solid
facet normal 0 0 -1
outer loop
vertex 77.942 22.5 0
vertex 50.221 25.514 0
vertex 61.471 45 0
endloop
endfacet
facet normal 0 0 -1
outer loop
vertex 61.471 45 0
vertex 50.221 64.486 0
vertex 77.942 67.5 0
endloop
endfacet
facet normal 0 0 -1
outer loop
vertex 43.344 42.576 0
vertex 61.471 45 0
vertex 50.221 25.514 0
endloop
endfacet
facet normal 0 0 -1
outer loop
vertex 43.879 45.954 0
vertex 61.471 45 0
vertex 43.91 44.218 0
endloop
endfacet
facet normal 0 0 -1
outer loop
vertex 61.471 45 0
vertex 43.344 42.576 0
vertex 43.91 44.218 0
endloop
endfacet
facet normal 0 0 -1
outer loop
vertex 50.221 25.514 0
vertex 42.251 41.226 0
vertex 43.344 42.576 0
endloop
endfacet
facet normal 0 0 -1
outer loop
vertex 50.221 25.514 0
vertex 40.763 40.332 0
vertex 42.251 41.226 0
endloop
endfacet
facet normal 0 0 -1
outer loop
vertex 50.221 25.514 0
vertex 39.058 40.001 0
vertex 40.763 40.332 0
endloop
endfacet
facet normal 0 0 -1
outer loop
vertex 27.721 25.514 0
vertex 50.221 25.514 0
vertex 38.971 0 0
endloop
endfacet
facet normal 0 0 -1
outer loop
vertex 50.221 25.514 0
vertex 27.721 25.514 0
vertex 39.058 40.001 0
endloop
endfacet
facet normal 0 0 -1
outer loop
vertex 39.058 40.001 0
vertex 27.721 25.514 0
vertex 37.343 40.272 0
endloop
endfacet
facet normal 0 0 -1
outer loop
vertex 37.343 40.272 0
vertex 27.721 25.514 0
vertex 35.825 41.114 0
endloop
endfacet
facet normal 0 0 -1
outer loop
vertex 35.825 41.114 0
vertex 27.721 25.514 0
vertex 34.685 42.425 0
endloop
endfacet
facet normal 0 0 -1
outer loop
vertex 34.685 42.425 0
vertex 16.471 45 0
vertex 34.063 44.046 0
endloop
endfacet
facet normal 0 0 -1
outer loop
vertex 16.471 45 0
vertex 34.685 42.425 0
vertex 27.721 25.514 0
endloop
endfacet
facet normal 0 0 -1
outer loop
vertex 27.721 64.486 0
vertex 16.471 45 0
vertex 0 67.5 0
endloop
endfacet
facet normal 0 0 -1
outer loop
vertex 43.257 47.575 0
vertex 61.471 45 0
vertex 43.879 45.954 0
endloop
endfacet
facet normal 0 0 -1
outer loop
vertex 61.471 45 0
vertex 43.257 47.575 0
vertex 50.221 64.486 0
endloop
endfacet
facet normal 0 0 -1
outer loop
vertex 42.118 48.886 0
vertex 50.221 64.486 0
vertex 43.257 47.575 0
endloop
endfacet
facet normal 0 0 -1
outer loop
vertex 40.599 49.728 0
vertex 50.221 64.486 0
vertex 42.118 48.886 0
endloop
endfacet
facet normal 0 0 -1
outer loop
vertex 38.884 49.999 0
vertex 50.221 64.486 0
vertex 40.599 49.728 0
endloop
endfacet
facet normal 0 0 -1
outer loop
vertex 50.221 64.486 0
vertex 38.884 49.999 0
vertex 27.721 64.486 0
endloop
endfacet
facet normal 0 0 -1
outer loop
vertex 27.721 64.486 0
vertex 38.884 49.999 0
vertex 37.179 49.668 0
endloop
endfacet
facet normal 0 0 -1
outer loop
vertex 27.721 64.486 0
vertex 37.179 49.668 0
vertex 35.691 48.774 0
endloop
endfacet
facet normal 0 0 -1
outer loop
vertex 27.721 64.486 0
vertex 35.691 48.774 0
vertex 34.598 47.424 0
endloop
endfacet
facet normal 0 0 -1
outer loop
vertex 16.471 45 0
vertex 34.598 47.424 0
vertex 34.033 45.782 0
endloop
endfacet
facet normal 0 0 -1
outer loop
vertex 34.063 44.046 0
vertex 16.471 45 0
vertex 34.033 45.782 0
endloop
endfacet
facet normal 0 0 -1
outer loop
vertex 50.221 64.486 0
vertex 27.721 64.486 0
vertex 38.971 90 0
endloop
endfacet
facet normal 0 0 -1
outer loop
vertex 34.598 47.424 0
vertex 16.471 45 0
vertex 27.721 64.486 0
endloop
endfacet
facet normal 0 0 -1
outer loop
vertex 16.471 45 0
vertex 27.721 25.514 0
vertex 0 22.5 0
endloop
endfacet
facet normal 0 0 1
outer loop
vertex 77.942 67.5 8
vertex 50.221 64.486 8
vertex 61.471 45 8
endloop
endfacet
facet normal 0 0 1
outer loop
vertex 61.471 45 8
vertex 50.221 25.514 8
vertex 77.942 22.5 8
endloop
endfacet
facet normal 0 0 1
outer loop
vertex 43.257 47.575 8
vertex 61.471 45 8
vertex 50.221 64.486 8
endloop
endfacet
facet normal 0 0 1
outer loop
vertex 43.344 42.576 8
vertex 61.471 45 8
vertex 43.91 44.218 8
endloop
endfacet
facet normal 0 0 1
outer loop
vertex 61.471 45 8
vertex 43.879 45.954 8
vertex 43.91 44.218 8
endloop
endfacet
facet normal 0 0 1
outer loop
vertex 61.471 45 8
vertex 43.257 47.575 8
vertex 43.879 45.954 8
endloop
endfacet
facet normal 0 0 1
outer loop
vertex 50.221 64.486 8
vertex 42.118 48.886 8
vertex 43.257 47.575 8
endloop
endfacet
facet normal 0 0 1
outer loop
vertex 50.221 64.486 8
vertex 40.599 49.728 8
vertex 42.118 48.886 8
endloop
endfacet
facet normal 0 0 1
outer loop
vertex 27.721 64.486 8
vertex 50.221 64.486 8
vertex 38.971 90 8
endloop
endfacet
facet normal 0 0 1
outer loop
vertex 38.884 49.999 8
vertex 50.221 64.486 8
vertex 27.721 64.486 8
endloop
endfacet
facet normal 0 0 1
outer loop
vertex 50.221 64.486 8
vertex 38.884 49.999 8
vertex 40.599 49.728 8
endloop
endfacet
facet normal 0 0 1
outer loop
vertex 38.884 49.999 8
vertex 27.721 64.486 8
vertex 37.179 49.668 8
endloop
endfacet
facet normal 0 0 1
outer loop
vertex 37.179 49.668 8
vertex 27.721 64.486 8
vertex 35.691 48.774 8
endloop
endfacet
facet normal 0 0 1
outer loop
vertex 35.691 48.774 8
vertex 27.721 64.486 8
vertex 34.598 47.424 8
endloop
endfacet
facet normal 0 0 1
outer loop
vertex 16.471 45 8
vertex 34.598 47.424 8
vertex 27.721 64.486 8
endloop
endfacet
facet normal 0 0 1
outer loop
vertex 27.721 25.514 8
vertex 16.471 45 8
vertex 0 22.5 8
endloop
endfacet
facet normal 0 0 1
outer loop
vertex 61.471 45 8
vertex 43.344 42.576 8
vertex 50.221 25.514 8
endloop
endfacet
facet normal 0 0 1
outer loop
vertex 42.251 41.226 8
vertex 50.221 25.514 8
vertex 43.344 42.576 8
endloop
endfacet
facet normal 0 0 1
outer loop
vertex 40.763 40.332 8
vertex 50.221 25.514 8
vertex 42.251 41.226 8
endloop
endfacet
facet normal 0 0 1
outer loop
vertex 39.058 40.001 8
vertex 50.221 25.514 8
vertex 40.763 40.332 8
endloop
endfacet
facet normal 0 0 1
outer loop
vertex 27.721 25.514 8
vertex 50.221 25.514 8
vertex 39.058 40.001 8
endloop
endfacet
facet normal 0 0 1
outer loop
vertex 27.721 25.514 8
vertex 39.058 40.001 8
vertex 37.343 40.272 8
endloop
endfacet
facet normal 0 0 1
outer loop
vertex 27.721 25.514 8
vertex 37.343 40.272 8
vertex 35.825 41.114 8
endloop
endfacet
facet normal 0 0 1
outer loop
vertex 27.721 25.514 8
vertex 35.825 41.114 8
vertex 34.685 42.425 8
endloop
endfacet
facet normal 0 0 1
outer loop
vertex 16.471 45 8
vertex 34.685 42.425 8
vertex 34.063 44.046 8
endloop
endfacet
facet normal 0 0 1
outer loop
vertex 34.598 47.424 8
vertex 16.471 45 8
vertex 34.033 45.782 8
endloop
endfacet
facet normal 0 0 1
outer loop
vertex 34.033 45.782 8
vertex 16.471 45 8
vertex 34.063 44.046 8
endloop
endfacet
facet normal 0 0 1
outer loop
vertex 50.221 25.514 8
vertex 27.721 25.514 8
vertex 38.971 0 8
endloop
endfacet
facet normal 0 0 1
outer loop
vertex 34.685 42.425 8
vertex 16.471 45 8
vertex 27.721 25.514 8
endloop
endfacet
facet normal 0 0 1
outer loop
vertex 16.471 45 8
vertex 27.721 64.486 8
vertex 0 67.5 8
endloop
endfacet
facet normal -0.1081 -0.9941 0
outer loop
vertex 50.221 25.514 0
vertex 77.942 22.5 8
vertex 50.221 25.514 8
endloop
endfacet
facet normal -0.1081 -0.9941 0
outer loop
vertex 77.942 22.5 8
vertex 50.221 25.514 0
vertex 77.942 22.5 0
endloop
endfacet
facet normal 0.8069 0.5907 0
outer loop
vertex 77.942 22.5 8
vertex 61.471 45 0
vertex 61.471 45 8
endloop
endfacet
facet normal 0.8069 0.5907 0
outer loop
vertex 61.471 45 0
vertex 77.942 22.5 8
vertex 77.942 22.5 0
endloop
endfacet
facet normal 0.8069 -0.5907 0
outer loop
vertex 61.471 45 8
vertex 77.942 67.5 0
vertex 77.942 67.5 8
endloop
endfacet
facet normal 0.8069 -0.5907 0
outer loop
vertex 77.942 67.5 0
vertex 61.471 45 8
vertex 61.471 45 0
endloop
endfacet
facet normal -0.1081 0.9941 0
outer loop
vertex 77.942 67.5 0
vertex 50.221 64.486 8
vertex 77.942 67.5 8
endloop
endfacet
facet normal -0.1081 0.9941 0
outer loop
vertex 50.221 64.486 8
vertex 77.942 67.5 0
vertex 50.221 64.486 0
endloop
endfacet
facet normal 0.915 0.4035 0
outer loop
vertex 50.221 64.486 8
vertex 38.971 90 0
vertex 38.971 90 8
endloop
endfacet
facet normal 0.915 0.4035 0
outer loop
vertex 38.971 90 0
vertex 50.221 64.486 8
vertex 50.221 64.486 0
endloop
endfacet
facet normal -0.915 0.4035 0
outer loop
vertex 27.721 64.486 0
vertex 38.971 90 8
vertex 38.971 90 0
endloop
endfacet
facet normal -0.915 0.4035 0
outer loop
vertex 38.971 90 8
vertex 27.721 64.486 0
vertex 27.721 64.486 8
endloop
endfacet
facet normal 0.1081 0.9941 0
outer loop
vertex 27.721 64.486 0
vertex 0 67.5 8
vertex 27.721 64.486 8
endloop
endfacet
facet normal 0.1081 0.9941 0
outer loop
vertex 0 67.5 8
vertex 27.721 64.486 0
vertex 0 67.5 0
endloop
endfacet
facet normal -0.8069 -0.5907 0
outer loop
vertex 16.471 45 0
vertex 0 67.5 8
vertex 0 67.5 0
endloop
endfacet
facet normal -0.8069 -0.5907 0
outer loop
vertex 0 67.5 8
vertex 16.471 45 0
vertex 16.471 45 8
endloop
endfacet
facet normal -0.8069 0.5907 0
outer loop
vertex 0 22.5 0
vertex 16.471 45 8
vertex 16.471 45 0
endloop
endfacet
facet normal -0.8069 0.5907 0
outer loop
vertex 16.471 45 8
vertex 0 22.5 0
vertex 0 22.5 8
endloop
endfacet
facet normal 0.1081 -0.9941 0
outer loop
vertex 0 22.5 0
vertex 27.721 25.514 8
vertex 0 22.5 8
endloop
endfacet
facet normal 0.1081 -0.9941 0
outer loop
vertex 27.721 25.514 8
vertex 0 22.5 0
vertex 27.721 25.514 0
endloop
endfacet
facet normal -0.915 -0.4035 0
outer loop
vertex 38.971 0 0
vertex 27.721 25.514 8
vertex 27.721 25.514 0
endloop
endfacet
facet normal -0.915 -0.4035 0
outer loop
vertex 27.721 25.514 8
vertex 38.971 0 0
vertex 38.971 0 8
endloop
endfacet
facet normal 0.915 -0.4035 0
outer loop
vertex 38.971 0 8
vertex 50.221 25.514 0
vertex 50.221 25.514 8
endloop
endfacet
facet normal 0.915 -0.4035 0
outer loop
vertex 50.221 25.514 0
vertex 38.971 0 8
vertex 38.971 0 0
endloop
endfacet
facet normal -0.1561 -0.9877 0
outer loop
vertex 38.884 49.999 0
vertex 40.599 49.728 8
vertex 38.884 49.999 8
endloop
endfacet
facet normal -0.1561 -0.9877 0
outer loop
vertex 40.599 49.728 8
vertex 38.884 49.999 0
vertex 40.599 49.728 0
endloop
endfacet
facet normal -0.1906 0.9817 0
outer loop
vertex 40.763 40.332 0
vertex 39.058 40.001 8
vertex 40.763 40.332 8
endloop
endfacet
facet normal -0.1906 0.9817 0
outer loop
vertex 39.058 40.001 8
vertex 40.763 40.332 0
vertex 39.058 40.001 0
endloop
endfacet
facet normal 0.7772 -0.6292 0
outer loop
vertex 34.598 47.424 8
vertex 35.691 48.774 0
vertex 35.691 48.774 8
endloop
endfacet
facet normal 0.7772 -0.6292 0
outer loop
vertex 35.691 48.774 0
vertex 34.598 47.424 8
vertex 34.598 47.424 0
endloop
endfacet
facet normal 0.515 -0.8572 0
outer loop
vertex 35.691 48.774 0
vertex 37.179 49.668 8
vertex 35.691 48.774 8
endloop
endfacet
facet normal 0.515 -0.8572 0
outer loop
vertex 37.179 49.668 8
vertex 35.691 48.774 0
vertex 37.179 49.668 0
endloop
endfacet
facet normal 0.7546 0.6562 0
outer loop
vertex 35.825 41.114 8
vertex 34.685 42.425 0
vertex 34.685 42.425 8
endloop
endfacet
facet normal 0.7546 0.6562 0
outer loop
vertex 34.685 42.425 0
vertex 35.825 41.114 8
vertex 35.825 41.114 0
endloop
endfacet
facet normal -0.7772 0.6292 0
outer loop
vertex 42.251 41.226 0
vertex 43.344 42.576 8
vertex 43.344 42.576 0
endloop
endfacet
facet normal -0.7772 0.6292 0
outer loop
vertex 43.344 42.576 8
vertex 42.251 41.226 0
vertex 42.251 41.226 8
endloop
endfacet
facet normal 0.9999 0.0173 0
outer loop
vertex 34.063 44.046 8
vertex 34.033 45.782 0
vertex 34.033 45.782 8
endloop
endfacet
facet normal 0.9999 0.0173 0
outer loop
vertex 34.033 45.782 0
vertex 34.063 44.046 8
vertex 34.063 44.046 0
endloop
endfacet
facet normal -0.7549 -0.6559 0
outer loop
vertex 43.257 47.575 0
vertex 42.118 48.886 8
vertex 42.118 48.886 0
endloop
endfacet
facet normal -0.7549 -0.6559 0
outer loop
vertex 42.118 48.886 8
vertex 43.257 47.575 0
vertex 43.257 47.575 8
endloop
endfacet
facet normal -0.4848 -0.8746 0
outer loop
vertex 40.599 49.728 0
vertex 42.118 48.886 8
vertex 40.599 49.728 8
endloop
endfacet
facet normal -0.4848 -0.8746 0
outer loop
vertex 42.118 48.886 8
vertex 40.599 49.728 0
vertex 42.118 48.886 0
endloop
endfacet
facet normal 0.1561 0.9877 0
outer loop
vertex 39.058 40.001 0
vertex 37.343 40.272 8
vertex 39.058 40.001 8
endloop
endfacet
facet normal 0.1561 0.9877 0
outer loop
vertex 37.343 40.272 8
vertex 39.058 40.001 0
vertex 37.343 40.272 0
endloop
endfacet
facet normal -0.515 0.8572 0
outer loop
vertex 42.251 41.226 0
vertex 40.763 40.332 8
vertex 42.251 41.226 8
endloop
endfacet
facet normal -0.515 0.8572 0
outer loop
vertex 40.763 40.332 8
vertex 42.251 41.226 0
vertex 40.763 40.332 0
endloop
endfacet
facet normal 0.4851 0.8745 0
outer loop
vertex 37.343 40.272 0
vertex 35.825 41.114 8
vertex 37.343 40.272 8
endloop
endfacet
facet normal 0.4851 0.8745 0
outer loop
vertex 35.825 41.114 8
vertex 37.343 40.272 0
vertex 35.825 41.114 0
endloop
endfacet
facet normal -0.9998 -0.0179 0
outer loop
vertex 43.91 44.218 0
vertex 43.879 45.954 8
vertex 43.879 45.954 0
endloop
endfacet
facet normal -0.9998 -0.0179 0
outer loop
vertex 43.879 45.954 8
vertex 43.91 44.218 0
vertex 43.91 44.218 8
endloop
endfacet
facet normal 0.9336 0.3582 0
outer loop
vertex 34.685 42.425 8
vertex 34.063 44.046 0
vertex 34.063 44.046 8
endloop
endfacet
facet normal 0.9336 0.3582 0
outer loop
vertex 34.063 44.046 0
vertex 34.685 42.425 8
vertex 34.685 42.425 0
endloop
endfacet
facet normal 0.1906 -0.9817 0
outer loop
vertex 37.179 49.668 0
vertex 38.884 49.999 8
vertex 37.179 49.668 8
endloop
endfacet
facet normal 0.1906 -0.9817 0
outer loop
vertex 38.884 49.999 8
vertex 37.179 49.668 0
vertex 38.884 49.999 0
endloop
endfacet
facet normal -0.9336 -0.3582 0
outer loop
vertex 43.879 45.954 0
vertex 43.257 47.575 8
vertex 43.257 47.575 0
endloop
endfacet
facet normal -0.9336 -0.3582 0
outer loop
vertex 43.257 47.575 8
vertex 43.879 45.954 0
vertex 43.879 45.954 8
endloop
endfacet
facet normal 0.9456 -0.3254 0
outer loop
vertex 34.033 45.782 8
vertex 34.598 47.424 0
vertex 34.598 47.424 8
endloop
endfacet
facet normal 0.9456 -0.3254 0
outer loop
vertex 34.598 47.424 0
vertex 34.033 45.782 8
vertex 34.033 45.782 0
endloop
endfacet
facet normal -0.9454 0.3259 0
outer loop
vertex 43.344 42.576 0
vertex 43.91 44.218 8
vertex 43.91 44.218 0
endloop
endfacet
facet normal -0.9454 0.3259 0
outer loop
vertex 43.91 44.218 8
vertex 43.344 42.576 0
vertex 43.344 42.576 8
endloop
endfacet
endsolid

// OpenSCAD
$fn = 32;

// ----------------------------------------------------------------------
// Star wheel: 6-point star, R45
// ----------------------------------------------------------------------

// --- parameters (mm) ---
n_points = 6;             // number of points / teeth
r_out = 45;               // tip radius
r_in = 22.5;              // root radius
bore_r = 5;               // centre bore radius
plate_t = 8;              // plate thickness, Z (extrusion height)
bore_d = 10;              // centre bore diameter

profile = [[38.971, 90], [27.721, 64.486], [0, 67.5], [16.471, 45], [0, 22.5], [27.721, 25.514], [38.971, 0], [50.221, 25.514], [77.942, 22.5], [61.471, 45], [77.942, 67.5], [50.221, 64.486]];  // primary outline, 12 points, counter clockwise
void_1 = [[43.879, 45.954], [43.257, 47.575], [42.118, 48.886], [40.599, 49.728], [38.884, 49.999], [37.179, 49.668], [35.691, 48.774], [34.598, 47.424], [34.033, 45.782], [34.063, 44.046], [34.685, 42.425], [35.825, 41.114], [37.343, 40.272], [39.058, 40.001], [40.763, 40.332], [42.251, 41.226], [43.344, 42.576], [43.91, 44.218]];  // centre bore, 18 points

// --- the one profile operation ---
difference() {
  linear_extrude(height = plate_t) polygon(points = profile);
  translate([0, 0, -1])
    linear_extrude(height = plate_t + 2) polygon(points = void_1);
}
